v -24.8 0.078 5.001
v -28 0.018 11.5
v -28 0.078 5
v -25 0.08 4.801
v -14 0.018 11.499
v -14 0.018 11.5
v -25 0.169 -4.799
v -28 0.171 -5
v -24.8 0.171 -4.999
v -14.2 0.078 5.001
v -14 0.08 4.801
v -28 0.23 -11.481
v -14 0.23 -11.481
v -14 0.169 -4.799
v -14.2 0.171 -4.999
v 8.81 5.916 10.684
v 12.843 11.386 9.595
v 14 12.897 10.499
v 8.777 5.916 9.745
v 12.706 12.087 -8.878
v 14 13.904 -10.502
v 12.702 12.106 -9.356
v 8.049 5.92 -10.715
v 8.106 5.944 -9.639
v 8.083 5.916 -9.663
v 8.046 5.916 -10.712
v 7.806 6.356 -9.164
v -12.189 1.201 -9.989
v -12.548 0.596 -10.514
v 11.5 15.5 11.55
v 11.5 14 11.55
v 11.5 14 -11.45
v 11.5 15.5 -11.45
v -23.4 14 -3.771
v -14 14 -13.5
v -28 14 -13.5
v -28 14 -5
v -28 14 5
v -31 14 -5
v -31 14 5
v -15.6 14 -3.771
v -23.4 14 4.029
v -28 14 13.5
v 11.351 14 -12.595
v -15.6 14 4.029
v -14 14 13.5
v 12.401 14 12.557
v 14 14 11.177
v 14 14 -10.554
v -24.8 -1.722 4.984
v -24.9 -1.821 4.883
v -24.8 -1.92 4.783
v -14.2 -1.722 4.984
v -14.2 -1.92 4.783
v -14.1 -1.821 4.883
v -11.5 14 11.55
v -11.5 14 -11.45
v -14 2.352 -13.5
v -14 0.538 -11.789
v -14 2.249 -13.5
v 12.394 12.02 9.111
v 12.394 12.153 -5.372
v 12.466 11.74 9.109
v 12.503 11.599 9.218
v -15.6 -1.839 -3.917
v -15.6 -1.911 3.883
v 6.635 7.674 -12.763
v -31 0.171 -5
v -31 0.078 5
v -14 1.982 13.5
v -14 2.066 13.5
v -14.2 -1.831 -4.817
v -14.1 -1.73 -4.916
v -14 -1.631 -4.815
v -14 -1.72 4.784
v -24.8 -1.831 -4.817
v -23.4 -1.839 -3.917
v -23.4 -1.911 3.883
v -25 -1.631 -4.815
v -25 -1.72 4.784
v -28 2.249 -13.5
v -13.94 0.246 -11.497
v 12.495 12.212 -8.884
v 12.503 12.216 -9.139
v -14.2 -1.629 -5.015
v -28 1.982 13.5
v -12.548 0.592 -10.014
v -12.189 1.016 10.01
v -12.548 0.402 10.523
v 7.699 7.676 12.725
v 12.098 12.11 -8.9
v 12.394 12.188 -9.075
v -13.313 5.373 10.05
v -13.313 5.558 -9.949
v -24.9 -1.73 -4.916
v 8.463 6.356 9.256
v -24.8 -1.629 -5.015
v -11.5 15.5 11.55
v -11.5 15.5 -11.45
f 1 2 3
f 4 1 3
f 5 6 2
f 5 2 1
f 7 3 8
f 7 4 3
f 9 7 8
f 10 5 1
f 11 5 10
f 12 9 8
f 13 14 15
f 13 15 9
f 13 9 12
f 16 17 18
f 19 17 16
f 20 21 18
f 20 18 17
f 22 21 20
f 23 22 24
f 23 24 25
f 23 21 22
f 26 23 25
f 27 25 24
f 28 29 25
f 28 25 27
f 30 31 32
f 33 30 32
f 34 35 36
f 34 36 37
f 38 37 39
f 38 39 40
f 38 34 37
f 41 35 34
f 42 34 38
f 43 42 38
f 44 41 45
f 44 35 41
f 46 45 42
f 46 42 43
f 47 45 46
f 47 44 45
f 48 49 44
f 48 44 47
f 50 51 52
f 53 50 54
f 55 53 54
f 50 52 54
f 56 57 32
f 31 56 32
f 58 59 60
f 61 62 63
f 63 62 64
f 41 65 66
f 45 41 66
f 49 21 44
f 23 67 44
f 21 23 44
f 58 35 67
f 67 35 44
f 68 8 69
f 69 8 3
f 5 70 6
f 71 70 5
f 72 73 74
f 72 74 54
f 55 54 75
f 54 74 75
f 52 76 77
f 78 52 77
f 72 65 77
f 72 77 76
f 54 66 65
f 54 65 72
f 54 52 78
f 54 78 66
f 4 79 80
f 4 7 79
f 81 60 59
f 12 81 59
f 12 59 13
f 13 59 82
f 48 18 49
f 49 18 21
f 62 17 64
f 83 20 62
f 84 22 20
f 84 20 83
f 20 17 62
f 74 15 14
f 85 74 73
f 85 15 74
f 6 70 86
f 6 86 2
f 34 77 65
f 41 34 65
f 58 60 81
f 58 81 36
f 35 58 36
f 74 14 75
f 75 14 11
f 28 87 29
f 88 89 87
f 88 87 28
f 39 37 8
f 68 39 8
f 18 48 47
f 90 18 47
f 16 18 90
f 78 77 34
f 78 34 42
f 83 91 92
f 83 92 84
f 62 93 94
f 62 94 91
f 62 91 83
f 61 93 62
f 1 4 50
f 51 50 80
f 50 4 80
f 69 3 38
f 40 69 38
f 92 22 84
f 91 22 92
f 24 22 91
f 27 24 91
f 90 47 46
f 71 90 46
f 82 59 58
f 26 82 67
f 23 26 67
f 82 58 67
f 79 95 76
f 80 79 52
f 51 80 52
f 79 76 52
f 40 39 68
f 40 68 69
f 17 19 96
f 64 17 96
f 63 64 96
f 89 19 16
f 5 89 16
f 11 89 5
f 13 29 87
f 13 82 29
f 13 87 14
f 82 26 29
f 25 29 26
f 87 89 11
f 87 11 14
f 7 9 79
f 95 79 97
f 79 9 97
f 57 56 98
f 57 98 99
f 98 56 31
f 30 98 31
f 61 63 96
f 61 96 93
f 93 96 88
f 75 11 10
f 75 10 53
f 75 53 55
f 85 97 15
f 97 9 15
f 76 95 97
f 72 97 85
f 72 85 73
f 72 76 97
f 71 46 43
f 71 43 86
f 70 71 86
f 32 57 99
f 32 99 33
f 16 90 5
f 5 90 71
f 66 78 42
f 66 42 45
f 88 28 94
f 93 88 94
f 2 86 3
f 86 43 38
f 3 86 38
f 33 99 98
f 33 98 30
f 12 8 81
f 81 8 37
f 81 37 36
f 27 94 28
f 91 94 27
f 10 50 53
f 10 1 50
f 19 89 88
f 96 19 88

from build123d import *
from OCP.BRepFilletAPI import BRepFilletAPI_MakeChamfer

# Parameters (mm, degrees)
SKETCH2_W               = 28
SKETCH2_H               = 27
BOSS_EXTRUDE1_DEPTH     = 14
CUT_EXTRUDE1_DEPTH      = 24.963513933
CUT_EXTRUDE1_DEPTH_BACK = 24.963513933
CUT_EXTRUDE2_DEPTH      = 34.265162244
CUT_EXTRUDE2_DEPTH_BACK = 34.265162244
CUT_EXTRUDE5_DEPTH      = 5
CHAMFER9_SIZE           = 2
CHAMFER9_SIZE2          = 2.125118495
CHAMFER9_SIZE2_2        = 2.036669754
CHAMFER10_SIZE          = 0.5
CHAMFER10_SIZE_2        = 0.499756853
CHAMFER10_SIZE_3        = 0.355609596
CHAMFER10_SIZE_4        = 0.478182949
SKETCH8_W               = 23
SKETCH8_H               = 23
BOSS_EXTRUDE3_DEPTH     = 1.5
BOSS_EXTRUDE4_DEPTH     = 14
CHAMFER11_SIZE          = 1.981809494
CHAMFER11_SIZE_2        = 2
CHAMFER11_SIZE_3        = 2.018700778
SKETCH11_W              = 11
SKETCH11_H              = 10
BOSS_EXTRUDE5_DEPTH     = 2
CUT_EXTRUDE6_DEPTH      = 36.61773346
CUT_EXTRUDE6_DEPTH_BACK = 36.61773346
SKETCH12_W              = 7.8
SKETCH12_H              = 7.8
BOSS_EXTRUDE6_DEPTH     = 3
CHAMFER13_SIZE          = 0.2
CHAMFER14_SIZE          = 0.2


with BuildPart() as part:
    # Sketch2 → Boss-Extrude1 (new body)
    with BuildSketch(Plane(origin=(0, 0, 0), x_dir=(1, 0, 0), z_dir=(0, 1, 0))):
        Rectangle(SKETCH2_W, SKETCH2_H)
    extrude(amount=BOSS_EXTRUDE1_DEPTH)

    # Sketch3 → Cut-Extrude1 (cut, two sides: drawn at the far end of the back side and taken through both)
    with BuildSketch(Plane.XZ.offset(-CUT_EXTRUDE1_DEPTH_BACK)):
        Polygon((14, 12.5), (-14, 13.5), (14, 13.5), align=None)
        Polygon((-14, -13.5), (14, -12.5), (14, -13.5), align=None)
    extrude(amount=CUT_EXTRUDE1_DEPTH + CUT_EXTRUDE1_DEPTH_BACK, mode=Mode.SUBTRACT)

    # Sketch4 → Cut-Extrude2 (cut, two sides: drawn at the far end of the back side and taken through both)
    with BuildSketch(Plane(origin=(0.463694268, 0, 12.98343949), x_dir=(0.9993628543475497, 0, -0.03569153051241239), z_dir=(0.03569153051241239, 0, 0.9993628543475497)).offset(-CUT_EXTRUDE2_DEPTH_BACK)):
        Polygon((4.393476436, 0), (13.544935829, 0), (14.437224092, 0), (14.437224092, 3.200858801), (14.437224092, 14), (8.423118558, 5.915663704), (-14.472915623, 0), align=None)
    extrude(amount=CUT_EXTRUDE2_DEPTH + CUT_EXTRUDE2_DEPTH_BACK, mode=Mode.SUBTRACT)

    # Sketch7 → Cut-Extrude5 (cut)
    with BuildSketch(Plane(origin=(-0.90510884, 3.505374242, 0.032325316), x_dir=(0.9682467311609488, 0.2499859061521866, 0.002305281199245587), z_dir=(0.24999653516826476, -0.9682055645501146, -0.00892844768458086))):
        Polygon((-11.52433294, 10), (-11.52433294, -10), (15.026440907, -9), (15.026440907, 9), align=None)
    extrude(amount=-CUT_EXTRUDE5_DEPTH, mode=Mode.SUBTRACT)

    # Chamfer9: one chamfer whose edges measure the first distance from different faces: ONE call of the kernel's chamfer builder (chamfer() names one face for all edges)
    chamfer9_edges_1 = [part.edges().sort_by_distance(p)[0] for p in [
        (10.987187207, 9.957831852, -12.607600457),
    ]]
    chamfer9_side_1 = [part.faces().sort_by_distance(p)[0] for p in [
        (8.200833453, 6.134911733, -10.944147911),
    ]]
    chamfer9_edges_2 = [part.edges().sort_by_distance(p)[0] for p in [
        (-3.012812793, 3.082324055, -13.107600457),
    ]]
    chamfer9_side_2 = [part.faces().sort_by_distance(p)[0] for p in [
        (8.472861151, 5.825901441, 10.976294715),
    ]]
    chamfer9_edges_3 = [part.edges().sort_by_distance(p)[0] for p in [
        (11.440723036, 9.358111881, 12.591402749),
        (-2.559276964, 2.957831852, 13.091402749),
    ]]
    chamfer9 = BRepFilletAPI_MakeChamfer(part.part.solid().wrapped)
    for e in chamfer9_edges_1:
        chamfer9.Add(CHAMFER9_SIZE, CHAMFER9_SIZE2, e.wrapped, chamfer9_side_1[0].wrapped)  # the first distance lies on this face
    for e in chamfer9_edges_2:
        chamfer9.Add(CHAMFER9_SIZE, CHAMFER9_SIZE2_2, e.wrapped, chamfer9_side_2[0].wrapped)  # the first distance lies on this face
    for e in chamfer9_edges_3:
        chamfer9.Add(CHAMFER9_SIZE, e.wrapped)
    add(Compound.cast(chamfer9.Shape()), mode=Mode.REPLACE)

    # Chamfer10
    # the kernel refuses this chamfer: 0.5, 0.499756853, 0.478182949, 0.355609596 mm, written as the material it takes off along each edge
    with BuildSketch(Plane(origin=(13.393805694, 12.150550502, 9.074748342), x_dir=(0.05808492213468299, -0.0159272826215481, 0.9981845838766), z_dir=(-0.5964718159494269, -0.8023350086458182, 0.021906772453014096))) as chamfer10_piece_1_section:
        Polygon((CHAMFER10_SIZE * 0.999621916911, CHAMFER10_SIZE * 0.0274958766106), (-CHAMFER10_SIZE_2 * 0.0270094090309, CHAMFER10_SIZE_2 * 0.99963518004), (0, 0), align=None)
    chamfer10_piece_1 = extrude(amount=9.056768515, mode=Mode.PRIVATE)
    chamfer10_piece_1 = split(chamfer10_piece_1, bisect_by=Plane(origin=(13.194045261, 8.919569719, 9.362412532), z_dir=(-0.9682467311609487, -0.2499859061521866, -0.002305281199245587)), keep=Keep.TOP, mode=Mode.PRIVATE)
    add(chamfer10_piece_1, mode=Mode.SUBTRACT)
    with BuildSketch(Plane(origin=(12.483603901, 11.851435136, -10.17642201), x_dir=(0.6410905937629469, 0.7670777517517646, 0.02438387492033602), z_dir=(0.007423820423546566, -0.03796872134677927, 0.9992513513073723))) as chamfer10_piece_2_section:
        Polygon((CHAMFER10_SIZE_3 * 0.998458969631, CHAMFER10_SIZE_3 * 0.0554949312847), (CHAMFER10_SIZE * 0.582893294976, CHAMFER10_SIZE * 0.812548710338), (0, 0), align=None)
    chamfer10_piece_2 = extrude(amount=20.579624749, mode=Mode.PRIVATE)
    chamfer10_piece_2 = split(chamfer10_piece_2, bisect_by=Plane(origin=(12.913774256, 11.712919177, 9.092338186), z_dir=(-0.03644190228685181, -0.00019400043812537604, -0.9993357544496974)), keep=Keep.TOP, mode=Mode.PRIVATE)
    chamfer10_piece_2 = split(chamfer10_piece_2, bisect_by=Plane(origin=(12.918206265, 11.879748292, -8.874602582), z_dir=(-0.036441902286851825, -0.01862343869573062, 0.9991622267123904)), keep=Keep.TOP, mode=Mode.PRIVATE)
    chamfer10_piece_2 = split(chamfer10_piece_2, bisect_by=Plane(origin=(12.481573161, 12.124794955, 0.172665498), z_dir=(0.24999653516826476, -0.9682055645501146, -0.008928447684580858)), keep=Keep.TOP, mode=Mode.PRIVATE)
    add(chamfer10_piece_2, mode=Mode.SUBTRACT)
    with BuildSketch(Plane(origin=(7.332927257, 4.885726315, -9.208673389), x_dir=(0.02308828920705216, 0.028593105881686263, -0.9993244544178482), z_dir=(0.5975594668303494, 0.8009831640871496, 0.03672403096566061))) as chamfer10_piece_3_section:
        Polygon((CHAMFER10_SIZE_4 * 0.99954799042, CHAMFER10_SIZE_4 * 0.0300634926507), (CHAMFER10_SIZE * 0.0166649416169, CHAMFER10_SIZE * 0.999861130218), (0, 0), align=None)
    chamfer10_piece_3 = extrude(amount=9.921337686, mode=Mode.PRIVATE)
    chamfer10_piece_3 = split(chamfer10_piece_3, bisect_by=Plane(origin=(13.127154568, 9.349828107, -9.200111372), z_dir=(-0.9682467311609487, -0.2499859061521866, -0.002305281199245587)), keep=Keep.TOP, mode=Mode.PRIVATE)
    chamfer10_piece_3 = split(chamfer10_piece_3, bisect_by=Plane(origin=(9.07925667, 11.33256006, -9.181827322), z_dir=(0.24999653516826476, -0.9682055645501146, -0.008928447684580858)), keep=Keep.TOP, mode=Mode.PRIVATE)
    add(chamfer10_piece_3, mode=Mode.SUBTRACT)
    with BuildSketch(Plane(origin=(10.002796446, 6.23732447, 9.199553239), x_dir=(0.04330199810393728, -0.02642773364671087, 0.9987124270051441), z_dir=(-0.9675607061893213, -0.25015584570028293, 0.035331752014273944))) as chamfer10_piece_4_section:
        Polygon((CHAMFER10_SIZE * 0.999621916911, CHAMFER10_SIZE * 0.0274958766106), (-CHAMFER10_SIZE * 0.0274958766106, CHAMFER10_SIZE * 0.999621916911), (0, 0), align=None)
    chamfer10_piece_4 = extrude(amount=24.091958818, mode=Mode.PRIVATE)
    chamfer10_piece_4 = split(chamfer10_piece_4, bisect_by=Plane(origin=(-12.104726667, 0.6943181, 9.74256285), z_dir=(0.9682467311609487, 0.2499859061521866, 0.002305281199245587)), keep=Keep.TOP, mode=Mode.PRIVATE)
    add(chamfer10_piece_4, mode=Mode.SUBTRACT)
    with BuildSketch(Plane(origin=(-12.063506538, 0.520383834, 11.291120145), x_dir=(-0.9610067795621441, -0.27651305144520855, -0.00254990510726875), z_dir=(0, 0.009221252597336898, -0.9999574833464352))) as chamfer10_piece_5_section:
        Polygon((CHAMFER10_SIZE * 0.999621916911, CHAMFER10_SIZE * 0.0274958766106), (-CHAMFER10_SIZE * 0.0274958766106, CHAMFER10_SIZE * 0.999621916911), (0, 0), align=None)
    chamfer10_piece_5 = extrude(amount=22.571682988, mode=Mode.PRIVATE)
    chamfer10_piece_5 = split(chamfer10_piece_5, bisect_by=Plane(origin=(-11.900053771, 0.744779528, 9.999331572), z_dir=(-0.03644190228685181, -0.00019400043812537604, -0.9993357544496974)), keep=Keep.TOP, mode=Mode.PRIVATE)
    chamfer10_piece_5 = split(chamfer10_piece_5, bisect_by=Plane(origin=(-11.900053771, 0.929057753, -9.983896039), z_dir=(-0.036441902286851825, -0.01862343869573062, 0.9991622267123904)), keep=Keep.TOP, mode=Mode.PRIVATE)
    add(chamfer10_piece_5, mode=Mode.SUBTRACT)
    with BuildSketch(Plane(origin=(-13.307636242, 0.395897718, -10.045171631), x_dir=(0.0433019981039377, -0.008005263248046781, -0.9990299558674586), z_dir=(0.9675607061893213, 0.24946172513101106, 0.03993904772377272))) as chamfer10_piece_6_section:
        Polygon((CHAMFER10_SIZE * 0.999621916911, CHAMFER10_SIZE * 0.0274958766106), (-CHAMFER10_SIZE * 0.0274958766106, CHAMFER10_SIZE * 0.999621916911), (0, 0), align=None)
    chamfer10_piece_6 = extrude(amount=23.412546433, mode=Mode.PRIVATE)
    chamfer10_piece_6 = split(chamfer10_piece_6, bisect_by=Plane(origin=(-12.104726559, 0.873987139, -9.740887367), z_dir=(0.9682467311609487, 0.2499859061521866, 0.002305281199245587)), keep=Keep.TOP, mode=Mode.PRIVATE)
    add(chamfer10_piece_6, mode=Mode.SUBTRACT)
    with BuildSketch(Plane(origin=(12.483603901, 11.851435136, -10.17642201), x_dir=(0.6410905937629469, 0.7670777517517646, 0.02438387492033602), z_dir=(0.007423820423546566, -0.03796872134677927, 0.9992513513073723))) as chamfer10_piece_7a_section:
        Polygon((CHAMFER10_SIZE_3 * 0.998458969631, CHAMFER10_SIZE_3 * 0.0554949312847), (CHAMFER10_SIZE * 0.582893294976, CHAMFER10_SIZE * 0.812548710338), (0, 0), align=None)
    chamfer10_piece_7a = extrude(amount=20.579624749, mode=Mode.PRIVATE)
    chamfer10_piece_7a = split(chamfer10_piece_7a, bisect_by=Plane(origin=(12.635030827, 11.348772137, 9.10257357), z_dir=(0.03644190228685181, 0.00019400043812537604, 0.9993357544496974)), keep=Keep.TOP, mode=Mode.PRIVATE)
    with BuildSketch(Plane(origin=(13.393805694, 12.150550502, 9.074748342), x_dir=(0.05808492213468299, -0.0159272826215481, 0.9981845838766), z_dir=(-0.5964718159494269, -0.8023350086458182, 0.021906772453014096))) as chamfer10_piece_7b_section:
        Polygon((CHAMFER10_SIZE * 0.999621916911, CHAMFER10_SIZE * 0.0274958766106), (-CHAMFER10_SIZE_2 * 0.0270094090309, CHAMFER10_SIZE_2 * 0.99963518004), (0, 0), align=None)
    chamfer10_piece_7b = extrude(amount=9.056768515, mode=Mode.PRIVATE)
    chamfer10_piece_7b = split(chamfer10_piece_7b, bisect_by=Plane(origin=(12.487037388, 11.658879354, 9.262321046), z_dir=(0.9682467311609487, 0.2499859061521866, 0.002305281199245587)), keep=Keep.TOP, mode=Mode.PRIVATE)
    chamfer10_piece_7 = chamfer10_piece_7a & chamfer10_piece_7b
    add(chamfer10_piece_7, mode=Mode.SUBTRACT)
    with BuildSketch(Plane(origin=(7.332927257, 4.885726315, -9.208673389), x_dir=(0.02308828920705216, 0.028593105881686263, -0.9993244544178482), z_dir=(0.5975594668303494, 0.8009831640871496, 0.03672403096566061))) as chamfer10_piece_8a_section:
        Polygon((CHAMFER10_SIZE_4 * 0.99954799042, CHAMFER10_SIZE_4 * 0.0300634926507), (CHAMFER10_SIZE * 0.0166649416169, CHAMFER10_SIZE * 0.999861130218), (0, 0), align=None)
    chamfer10_piece_8a = extrude(amount=9.921337686, mode=Mode.PRIVATE)
    chamfer10_piece_8a = split(chamfer10_piece_8a, bisect_by=Plane(origin=(12.430073193, 12.048679653, -9.082159345), z_dir=(0.9682467311609487, 0.2499859061521866, 0.002305281199245587)), keep=Keep.TOP, mode=Mode.PRIVATE)
    chamfer10_piece_8a = split(chamfer10_piece_8a, bisect_by=Plane(origin=(12.566907766, 12.23215797, -9.080467373), z_dir=(0.24999653516826476, -0.9682055645501146, -0.008928447684580858)), keep=Keep.TOP, mode=Mode.PRIVATE)
    with BuildSketch(Plane(origin=(12.483603901, 11.851435136, -10.17642201), x_dir=(0.6410905937629469, 0.7670777517517646, 0.02438387492033602), z_dir=(0.007423820423546566, -0.03796872134677927, 0.9992513513073723))) as chamfer10_piece_8b_section:
        Polygon((CHAMFER10_SIZE_3 * 0.998458969631, CHAMFER10_SIZE_3 * 0.0554949312847), (CHAMFER10_SIZE * 0.582893294976, CHAMFER10_SIZE * 0.812548710338), (0, 0), align=None)
    chamfer10_piece_8b = extrude(amount=20.579624749, mode=Mode.PRIVATE)
    chamfer10_piece_8b = split(chamfer10_piece_8b, bisect_by=Plane(origin=(12.507794791, 12.045003198, -8.886491102), z_dir=(0.036441902286851825, 0.01862343869573062, -0.9991622267123904)), keep=Keep.TOP, mode=Mode.PRIVATE)
    chamfer10_piece_8b = split(chamfer10_piece_8b, bisect_by=Plane(origin=(12.489689166, 12.216249647, -9.517481187), z_dir=(0.24999653516826476, -0.9682055645501146, -0.008928447684580858)), keep=Keep.TOP, mode=Mode.PRIVATE)
    chamfer10_piece_8 = chamfer10_piece_8a & chamfer10_piece_8b
    add(chamfer10_piece_8, mode=Mode.SUBTRACT)
    with BuildSketch(Plane(origin=(10.002796446, 6.23732447, 9.199553239), x_dir=(0.04330199810393728, -0.02642773364671087, 0.9987124270051441), z_dir=(-0.9675607061893213, -0.25015584570028293, 0.035331752014273944))) as chamfer10_piece_9a_section:
        Polygon((CHAMFER10_SIZE * 0.999621916911, CHAMFER10_SIZE * 0.0274958766106), (-CHAMFER10_SIZE * 0.0274958766106, CHAMFER10_SIZE * 0.999621916911), (0, 0), align=None)
    chamfer10_piece_9a = extrude(amount=24.091958818, mode=Mode.PRIVATE)
    chamfer10_piece_9a = split(chamfer10_piece_9a, bisect_by=Plane(origin=(-12.10479262, 0.6903974, 10.195426996), z_dir=(-0.9682467311609487, -0.2499859061521866, -0.002305281199245587)), keep=Keep.TOP, mode=Mode.PRIVATE)
    with BuildSketch(Plane(origin=(-12.063506538, 0.520383834, 11.291120145), x_dir=(-0.9610067795621441, -0.27651305144520855, -0.00254990510726875), z_dir=(0, 0.009221252597336898, -0.9999574833464352))) as chamfer10_piece_9b_section:
        Polygon((CHAMFER10_SIZE * 0.999621916911, CHAMFER10_SIZE * 0.0274958766106), (-CHAMFER10_SIZE * 0.0274958766106, CHAMFER10_SIZE * 0.999621916911), (0, 0), align=None)
    chamfer10_piece_9b = extrude(amount=22.571682988, mode=Mode.PRIVATE)
    chamfer10_piece_9b = split(chamfer10_piece_9b, bisect_by=Plane(origin=(-12.287300879, 0.644950584, 10.013472353), z_dir=(0.03644190228685181, 0.00019400043812537604, 0.9993357544496974)), keep=Keep.TOP, mode=Mode.PRIVATE)
    chamfer10_piece_9 = chamfer10_piece_9a & chamfer10_piece_9b
    add(chamfer10_piece_9, mode=Mode.SUBTRACT)
    with BuildSketch(Plane(origin=(-12.063506538, 0.520383834, 11.291120145), x_dir=(-0.9610067795621441, -0.27651305144520855, -0.00254990510726875), z_dir=(0, 0.009221252597336898, -0.9999574833464352))) as chamfer10_piece_10a_section:
        Polygon((CHAMFER10_SIZE * 0.999621916911, CHAMFER10_SIZE * 0.0274958766106), (-CHAMFER10_SIZE * 0.0274958766106, CHAMFER10_SIZE * 0.999621916911), (0, 0), align=None)
    chamfer10_piece_10a = extrude(amount=22.571682988, mode=Mode.PRIVATE)
    chamfer10_piece_10a = split(chamfer10_piece_10a, bisect_by=Plane(origin=(-12.287300879, 0.829506566, -9.999875433), z_dir=(0.036441902286851825, 0.01862343869573062, -0.9991622267123904)), keep=Keep.TOP, mode=Mode.PRIVATE)
    with BuildSketch(Plane(origin=(-13.307636242, 0.395897718, -10.045171631), x_dir=(0.0433019981039377, -0.008005263248046781, -0.9990299558674586), z_dir=(0.9675607061893213, 0.24946172513101106, 0.03993904772377272))) as chamfer10_piece_10b_section:
        Polygon((CHAMFER10_SIZE * 0.999621916911, CHAMFER10_SIZE * 0.0274958766106), (-CHAMFER10_SIZE * 0.0274958766106, CHAMFER10_SIZE * 0.999621916911), (0, 0), align=None)
    chamfer10_piece_10b = extrude(amount=23.412546433, mode=Mode.PRIVATE)
    chamfer10_piece_10b = split(chamfer10_piece_10b, bisect_by=Plane(origin=(-12.10479262, 0.87830121, -10.180961015), z_dir=(-0.9682467311609487, -0.2499859061521866, -0.002305281199245587)), keep=Keep.TOP, mode=Mode.PRIVATE)
    chamfer10_piece_10 = chamfer10_piece_10a & chamfer10_piece_10b
    add(chamfer10_piece_10, mode=Mode.SUBTRACT)

    # Sketch9 → Boss-Extrude4 (add)
    with BuildSketch(Plane.ZY.offset(14)):
        Polygon((13.5, 14), (13.5, 0), (-13.5, 0.248984406), (-13.5, 14), align=None)
    extrude(amount=BOSS_EXTRUDE4_DEPTH)

    # Chamfer11
    # the kernel refuses this chamfer: 2.018700778, 2, 1.981809494 mm, written as the material it takes off along each edge
    with BuildSketch(Plane(origin=(-8.856634024, 0, 13.5), x_dir=(0, 0.999607847931299, 0.028002684766947932), z_dir=(-1, 0, 0))) as chamfer11_piece_1:
        Polygon((CHAMFER11_SIZE * 0.999607847913, CHAMFER11_SIZE * 0.0280026847664), (-CHAMFER11_SIZE_2 * 0.0187838577224, CHAMFER11_SIZE_2 * 0.99982356778), (0, 0), align=None)
    extrude(amount=24.286731952, mode=Mode.SUBTRACT)
    with BuildSketch(Plane(origin=(-8.807268021, 0.248984406, -13.5), x_dir=(0, 0.9996150154540677, -0.027745646122666685), z_dir=(-1, 0, 0))) as chamfer11_piece_2:
        Polygon((CHAMFER11_SIZE_2 * 0.999615015454, -CHAMFER11_SIZE_2 * 0.0277456461227), (-CHAMFER11_SIZE_3 * 0.0369621690318, -CHAMFER11_SIZE_3 * 0.999316665654), (0, 0), align=None)
    extrude(amount=24.385463958, mode=Mode.SUBTRACT)

    # Sketch11 → Boss-Extrude5 (add)
    with BuildSketch(Plane(origin=(0, 0.124481617, 0.001147925), x_dir=(1, 0, 0), z_dir=(0, -0.9999574833464353, -0.00922125259733687))):
        with Locations((-19.5, 0)):
            Rectangle(SKETCH11_W, SKETCH11_H)
    extrude(amount=BOSS_EXTRUDE5_DEPTH)

    # Sketch12 → Cut-Extrude6 (cut, two sides: drawn at the far end of the back side and taken through both)
    with BuildSketch(Plane(origin=(0, -1.875433349, -0.01729458), x_dir=(1, 0, 0), z_dir=(0, -0.9999574833464353, -0.009221252597336872)).offset(-CUT_EXTRUDE6_DEPTH_BACK)):
        with Locations((-19.5, 0)):
            Rectangle(SKETCH12_W, SKETCH12_H)
    extrude(amount=CUT_EXTRUDE6_DEPTH + CUT_EXTRUDE6_DEPTH_BACK, mode=Mode.SUBTRACT)

    # Sketch13 → Boss-Extrude6 (add)
    with BuildSketch(Plane.ZY.offset(28)):
        Polygon((4.999787417, 0.07838594), (4.999787417, 14), (-4.999787417, 14), (-4.999787417, 0.170598466), align=None)
    extrude(amount=BOSS_EXTRUDE6_DEPTH)

    # Chamfer13
    chamfer13_edges = [part.edges().sort_by_distance(p)[0] for p in [
        (-14, -1.875433349, -0.01729458),
        (-19.5, -1.921539612, 4.982492837),
        (-25, -1.875433349, -0.01729458),
        (-19.5, -1.829327086, -5.017081997),
    ]]
    chamfer(chamfer13_edges, length=CHAMFER13_SIZE)

    # Chamfer14
    chamfer14_edges = [part.edges().sort_by_distance(p)[0] for p in [
        (-25, -0.821586381, 4.992636215),
        (-14, -0.821586381, 4.992636215),
        (-25, -0.729373855, -5.006938619),
        (-14, -0.729373855, -5.006938619),
    ]]
    chamfer(chamfer14_edges, length=CHAMFER14_SIZE)


with BuildPart() as body_2:
    # Sketch8 → Boss-Extrude3 (new body)
    with BuildSketch(Plane(origin=(0, 14, 0), x_dir=(1, 0, 0), z_dir=(0, 1, 0))):
        with Locations((0, -0.05)):
            Rectangle(SKETCH8_W, SKETCH8_H)
    extrude(amount=BOSS_EXTRUDE3_DEPTH)


solid = Compound([part.part, body_2.part])
